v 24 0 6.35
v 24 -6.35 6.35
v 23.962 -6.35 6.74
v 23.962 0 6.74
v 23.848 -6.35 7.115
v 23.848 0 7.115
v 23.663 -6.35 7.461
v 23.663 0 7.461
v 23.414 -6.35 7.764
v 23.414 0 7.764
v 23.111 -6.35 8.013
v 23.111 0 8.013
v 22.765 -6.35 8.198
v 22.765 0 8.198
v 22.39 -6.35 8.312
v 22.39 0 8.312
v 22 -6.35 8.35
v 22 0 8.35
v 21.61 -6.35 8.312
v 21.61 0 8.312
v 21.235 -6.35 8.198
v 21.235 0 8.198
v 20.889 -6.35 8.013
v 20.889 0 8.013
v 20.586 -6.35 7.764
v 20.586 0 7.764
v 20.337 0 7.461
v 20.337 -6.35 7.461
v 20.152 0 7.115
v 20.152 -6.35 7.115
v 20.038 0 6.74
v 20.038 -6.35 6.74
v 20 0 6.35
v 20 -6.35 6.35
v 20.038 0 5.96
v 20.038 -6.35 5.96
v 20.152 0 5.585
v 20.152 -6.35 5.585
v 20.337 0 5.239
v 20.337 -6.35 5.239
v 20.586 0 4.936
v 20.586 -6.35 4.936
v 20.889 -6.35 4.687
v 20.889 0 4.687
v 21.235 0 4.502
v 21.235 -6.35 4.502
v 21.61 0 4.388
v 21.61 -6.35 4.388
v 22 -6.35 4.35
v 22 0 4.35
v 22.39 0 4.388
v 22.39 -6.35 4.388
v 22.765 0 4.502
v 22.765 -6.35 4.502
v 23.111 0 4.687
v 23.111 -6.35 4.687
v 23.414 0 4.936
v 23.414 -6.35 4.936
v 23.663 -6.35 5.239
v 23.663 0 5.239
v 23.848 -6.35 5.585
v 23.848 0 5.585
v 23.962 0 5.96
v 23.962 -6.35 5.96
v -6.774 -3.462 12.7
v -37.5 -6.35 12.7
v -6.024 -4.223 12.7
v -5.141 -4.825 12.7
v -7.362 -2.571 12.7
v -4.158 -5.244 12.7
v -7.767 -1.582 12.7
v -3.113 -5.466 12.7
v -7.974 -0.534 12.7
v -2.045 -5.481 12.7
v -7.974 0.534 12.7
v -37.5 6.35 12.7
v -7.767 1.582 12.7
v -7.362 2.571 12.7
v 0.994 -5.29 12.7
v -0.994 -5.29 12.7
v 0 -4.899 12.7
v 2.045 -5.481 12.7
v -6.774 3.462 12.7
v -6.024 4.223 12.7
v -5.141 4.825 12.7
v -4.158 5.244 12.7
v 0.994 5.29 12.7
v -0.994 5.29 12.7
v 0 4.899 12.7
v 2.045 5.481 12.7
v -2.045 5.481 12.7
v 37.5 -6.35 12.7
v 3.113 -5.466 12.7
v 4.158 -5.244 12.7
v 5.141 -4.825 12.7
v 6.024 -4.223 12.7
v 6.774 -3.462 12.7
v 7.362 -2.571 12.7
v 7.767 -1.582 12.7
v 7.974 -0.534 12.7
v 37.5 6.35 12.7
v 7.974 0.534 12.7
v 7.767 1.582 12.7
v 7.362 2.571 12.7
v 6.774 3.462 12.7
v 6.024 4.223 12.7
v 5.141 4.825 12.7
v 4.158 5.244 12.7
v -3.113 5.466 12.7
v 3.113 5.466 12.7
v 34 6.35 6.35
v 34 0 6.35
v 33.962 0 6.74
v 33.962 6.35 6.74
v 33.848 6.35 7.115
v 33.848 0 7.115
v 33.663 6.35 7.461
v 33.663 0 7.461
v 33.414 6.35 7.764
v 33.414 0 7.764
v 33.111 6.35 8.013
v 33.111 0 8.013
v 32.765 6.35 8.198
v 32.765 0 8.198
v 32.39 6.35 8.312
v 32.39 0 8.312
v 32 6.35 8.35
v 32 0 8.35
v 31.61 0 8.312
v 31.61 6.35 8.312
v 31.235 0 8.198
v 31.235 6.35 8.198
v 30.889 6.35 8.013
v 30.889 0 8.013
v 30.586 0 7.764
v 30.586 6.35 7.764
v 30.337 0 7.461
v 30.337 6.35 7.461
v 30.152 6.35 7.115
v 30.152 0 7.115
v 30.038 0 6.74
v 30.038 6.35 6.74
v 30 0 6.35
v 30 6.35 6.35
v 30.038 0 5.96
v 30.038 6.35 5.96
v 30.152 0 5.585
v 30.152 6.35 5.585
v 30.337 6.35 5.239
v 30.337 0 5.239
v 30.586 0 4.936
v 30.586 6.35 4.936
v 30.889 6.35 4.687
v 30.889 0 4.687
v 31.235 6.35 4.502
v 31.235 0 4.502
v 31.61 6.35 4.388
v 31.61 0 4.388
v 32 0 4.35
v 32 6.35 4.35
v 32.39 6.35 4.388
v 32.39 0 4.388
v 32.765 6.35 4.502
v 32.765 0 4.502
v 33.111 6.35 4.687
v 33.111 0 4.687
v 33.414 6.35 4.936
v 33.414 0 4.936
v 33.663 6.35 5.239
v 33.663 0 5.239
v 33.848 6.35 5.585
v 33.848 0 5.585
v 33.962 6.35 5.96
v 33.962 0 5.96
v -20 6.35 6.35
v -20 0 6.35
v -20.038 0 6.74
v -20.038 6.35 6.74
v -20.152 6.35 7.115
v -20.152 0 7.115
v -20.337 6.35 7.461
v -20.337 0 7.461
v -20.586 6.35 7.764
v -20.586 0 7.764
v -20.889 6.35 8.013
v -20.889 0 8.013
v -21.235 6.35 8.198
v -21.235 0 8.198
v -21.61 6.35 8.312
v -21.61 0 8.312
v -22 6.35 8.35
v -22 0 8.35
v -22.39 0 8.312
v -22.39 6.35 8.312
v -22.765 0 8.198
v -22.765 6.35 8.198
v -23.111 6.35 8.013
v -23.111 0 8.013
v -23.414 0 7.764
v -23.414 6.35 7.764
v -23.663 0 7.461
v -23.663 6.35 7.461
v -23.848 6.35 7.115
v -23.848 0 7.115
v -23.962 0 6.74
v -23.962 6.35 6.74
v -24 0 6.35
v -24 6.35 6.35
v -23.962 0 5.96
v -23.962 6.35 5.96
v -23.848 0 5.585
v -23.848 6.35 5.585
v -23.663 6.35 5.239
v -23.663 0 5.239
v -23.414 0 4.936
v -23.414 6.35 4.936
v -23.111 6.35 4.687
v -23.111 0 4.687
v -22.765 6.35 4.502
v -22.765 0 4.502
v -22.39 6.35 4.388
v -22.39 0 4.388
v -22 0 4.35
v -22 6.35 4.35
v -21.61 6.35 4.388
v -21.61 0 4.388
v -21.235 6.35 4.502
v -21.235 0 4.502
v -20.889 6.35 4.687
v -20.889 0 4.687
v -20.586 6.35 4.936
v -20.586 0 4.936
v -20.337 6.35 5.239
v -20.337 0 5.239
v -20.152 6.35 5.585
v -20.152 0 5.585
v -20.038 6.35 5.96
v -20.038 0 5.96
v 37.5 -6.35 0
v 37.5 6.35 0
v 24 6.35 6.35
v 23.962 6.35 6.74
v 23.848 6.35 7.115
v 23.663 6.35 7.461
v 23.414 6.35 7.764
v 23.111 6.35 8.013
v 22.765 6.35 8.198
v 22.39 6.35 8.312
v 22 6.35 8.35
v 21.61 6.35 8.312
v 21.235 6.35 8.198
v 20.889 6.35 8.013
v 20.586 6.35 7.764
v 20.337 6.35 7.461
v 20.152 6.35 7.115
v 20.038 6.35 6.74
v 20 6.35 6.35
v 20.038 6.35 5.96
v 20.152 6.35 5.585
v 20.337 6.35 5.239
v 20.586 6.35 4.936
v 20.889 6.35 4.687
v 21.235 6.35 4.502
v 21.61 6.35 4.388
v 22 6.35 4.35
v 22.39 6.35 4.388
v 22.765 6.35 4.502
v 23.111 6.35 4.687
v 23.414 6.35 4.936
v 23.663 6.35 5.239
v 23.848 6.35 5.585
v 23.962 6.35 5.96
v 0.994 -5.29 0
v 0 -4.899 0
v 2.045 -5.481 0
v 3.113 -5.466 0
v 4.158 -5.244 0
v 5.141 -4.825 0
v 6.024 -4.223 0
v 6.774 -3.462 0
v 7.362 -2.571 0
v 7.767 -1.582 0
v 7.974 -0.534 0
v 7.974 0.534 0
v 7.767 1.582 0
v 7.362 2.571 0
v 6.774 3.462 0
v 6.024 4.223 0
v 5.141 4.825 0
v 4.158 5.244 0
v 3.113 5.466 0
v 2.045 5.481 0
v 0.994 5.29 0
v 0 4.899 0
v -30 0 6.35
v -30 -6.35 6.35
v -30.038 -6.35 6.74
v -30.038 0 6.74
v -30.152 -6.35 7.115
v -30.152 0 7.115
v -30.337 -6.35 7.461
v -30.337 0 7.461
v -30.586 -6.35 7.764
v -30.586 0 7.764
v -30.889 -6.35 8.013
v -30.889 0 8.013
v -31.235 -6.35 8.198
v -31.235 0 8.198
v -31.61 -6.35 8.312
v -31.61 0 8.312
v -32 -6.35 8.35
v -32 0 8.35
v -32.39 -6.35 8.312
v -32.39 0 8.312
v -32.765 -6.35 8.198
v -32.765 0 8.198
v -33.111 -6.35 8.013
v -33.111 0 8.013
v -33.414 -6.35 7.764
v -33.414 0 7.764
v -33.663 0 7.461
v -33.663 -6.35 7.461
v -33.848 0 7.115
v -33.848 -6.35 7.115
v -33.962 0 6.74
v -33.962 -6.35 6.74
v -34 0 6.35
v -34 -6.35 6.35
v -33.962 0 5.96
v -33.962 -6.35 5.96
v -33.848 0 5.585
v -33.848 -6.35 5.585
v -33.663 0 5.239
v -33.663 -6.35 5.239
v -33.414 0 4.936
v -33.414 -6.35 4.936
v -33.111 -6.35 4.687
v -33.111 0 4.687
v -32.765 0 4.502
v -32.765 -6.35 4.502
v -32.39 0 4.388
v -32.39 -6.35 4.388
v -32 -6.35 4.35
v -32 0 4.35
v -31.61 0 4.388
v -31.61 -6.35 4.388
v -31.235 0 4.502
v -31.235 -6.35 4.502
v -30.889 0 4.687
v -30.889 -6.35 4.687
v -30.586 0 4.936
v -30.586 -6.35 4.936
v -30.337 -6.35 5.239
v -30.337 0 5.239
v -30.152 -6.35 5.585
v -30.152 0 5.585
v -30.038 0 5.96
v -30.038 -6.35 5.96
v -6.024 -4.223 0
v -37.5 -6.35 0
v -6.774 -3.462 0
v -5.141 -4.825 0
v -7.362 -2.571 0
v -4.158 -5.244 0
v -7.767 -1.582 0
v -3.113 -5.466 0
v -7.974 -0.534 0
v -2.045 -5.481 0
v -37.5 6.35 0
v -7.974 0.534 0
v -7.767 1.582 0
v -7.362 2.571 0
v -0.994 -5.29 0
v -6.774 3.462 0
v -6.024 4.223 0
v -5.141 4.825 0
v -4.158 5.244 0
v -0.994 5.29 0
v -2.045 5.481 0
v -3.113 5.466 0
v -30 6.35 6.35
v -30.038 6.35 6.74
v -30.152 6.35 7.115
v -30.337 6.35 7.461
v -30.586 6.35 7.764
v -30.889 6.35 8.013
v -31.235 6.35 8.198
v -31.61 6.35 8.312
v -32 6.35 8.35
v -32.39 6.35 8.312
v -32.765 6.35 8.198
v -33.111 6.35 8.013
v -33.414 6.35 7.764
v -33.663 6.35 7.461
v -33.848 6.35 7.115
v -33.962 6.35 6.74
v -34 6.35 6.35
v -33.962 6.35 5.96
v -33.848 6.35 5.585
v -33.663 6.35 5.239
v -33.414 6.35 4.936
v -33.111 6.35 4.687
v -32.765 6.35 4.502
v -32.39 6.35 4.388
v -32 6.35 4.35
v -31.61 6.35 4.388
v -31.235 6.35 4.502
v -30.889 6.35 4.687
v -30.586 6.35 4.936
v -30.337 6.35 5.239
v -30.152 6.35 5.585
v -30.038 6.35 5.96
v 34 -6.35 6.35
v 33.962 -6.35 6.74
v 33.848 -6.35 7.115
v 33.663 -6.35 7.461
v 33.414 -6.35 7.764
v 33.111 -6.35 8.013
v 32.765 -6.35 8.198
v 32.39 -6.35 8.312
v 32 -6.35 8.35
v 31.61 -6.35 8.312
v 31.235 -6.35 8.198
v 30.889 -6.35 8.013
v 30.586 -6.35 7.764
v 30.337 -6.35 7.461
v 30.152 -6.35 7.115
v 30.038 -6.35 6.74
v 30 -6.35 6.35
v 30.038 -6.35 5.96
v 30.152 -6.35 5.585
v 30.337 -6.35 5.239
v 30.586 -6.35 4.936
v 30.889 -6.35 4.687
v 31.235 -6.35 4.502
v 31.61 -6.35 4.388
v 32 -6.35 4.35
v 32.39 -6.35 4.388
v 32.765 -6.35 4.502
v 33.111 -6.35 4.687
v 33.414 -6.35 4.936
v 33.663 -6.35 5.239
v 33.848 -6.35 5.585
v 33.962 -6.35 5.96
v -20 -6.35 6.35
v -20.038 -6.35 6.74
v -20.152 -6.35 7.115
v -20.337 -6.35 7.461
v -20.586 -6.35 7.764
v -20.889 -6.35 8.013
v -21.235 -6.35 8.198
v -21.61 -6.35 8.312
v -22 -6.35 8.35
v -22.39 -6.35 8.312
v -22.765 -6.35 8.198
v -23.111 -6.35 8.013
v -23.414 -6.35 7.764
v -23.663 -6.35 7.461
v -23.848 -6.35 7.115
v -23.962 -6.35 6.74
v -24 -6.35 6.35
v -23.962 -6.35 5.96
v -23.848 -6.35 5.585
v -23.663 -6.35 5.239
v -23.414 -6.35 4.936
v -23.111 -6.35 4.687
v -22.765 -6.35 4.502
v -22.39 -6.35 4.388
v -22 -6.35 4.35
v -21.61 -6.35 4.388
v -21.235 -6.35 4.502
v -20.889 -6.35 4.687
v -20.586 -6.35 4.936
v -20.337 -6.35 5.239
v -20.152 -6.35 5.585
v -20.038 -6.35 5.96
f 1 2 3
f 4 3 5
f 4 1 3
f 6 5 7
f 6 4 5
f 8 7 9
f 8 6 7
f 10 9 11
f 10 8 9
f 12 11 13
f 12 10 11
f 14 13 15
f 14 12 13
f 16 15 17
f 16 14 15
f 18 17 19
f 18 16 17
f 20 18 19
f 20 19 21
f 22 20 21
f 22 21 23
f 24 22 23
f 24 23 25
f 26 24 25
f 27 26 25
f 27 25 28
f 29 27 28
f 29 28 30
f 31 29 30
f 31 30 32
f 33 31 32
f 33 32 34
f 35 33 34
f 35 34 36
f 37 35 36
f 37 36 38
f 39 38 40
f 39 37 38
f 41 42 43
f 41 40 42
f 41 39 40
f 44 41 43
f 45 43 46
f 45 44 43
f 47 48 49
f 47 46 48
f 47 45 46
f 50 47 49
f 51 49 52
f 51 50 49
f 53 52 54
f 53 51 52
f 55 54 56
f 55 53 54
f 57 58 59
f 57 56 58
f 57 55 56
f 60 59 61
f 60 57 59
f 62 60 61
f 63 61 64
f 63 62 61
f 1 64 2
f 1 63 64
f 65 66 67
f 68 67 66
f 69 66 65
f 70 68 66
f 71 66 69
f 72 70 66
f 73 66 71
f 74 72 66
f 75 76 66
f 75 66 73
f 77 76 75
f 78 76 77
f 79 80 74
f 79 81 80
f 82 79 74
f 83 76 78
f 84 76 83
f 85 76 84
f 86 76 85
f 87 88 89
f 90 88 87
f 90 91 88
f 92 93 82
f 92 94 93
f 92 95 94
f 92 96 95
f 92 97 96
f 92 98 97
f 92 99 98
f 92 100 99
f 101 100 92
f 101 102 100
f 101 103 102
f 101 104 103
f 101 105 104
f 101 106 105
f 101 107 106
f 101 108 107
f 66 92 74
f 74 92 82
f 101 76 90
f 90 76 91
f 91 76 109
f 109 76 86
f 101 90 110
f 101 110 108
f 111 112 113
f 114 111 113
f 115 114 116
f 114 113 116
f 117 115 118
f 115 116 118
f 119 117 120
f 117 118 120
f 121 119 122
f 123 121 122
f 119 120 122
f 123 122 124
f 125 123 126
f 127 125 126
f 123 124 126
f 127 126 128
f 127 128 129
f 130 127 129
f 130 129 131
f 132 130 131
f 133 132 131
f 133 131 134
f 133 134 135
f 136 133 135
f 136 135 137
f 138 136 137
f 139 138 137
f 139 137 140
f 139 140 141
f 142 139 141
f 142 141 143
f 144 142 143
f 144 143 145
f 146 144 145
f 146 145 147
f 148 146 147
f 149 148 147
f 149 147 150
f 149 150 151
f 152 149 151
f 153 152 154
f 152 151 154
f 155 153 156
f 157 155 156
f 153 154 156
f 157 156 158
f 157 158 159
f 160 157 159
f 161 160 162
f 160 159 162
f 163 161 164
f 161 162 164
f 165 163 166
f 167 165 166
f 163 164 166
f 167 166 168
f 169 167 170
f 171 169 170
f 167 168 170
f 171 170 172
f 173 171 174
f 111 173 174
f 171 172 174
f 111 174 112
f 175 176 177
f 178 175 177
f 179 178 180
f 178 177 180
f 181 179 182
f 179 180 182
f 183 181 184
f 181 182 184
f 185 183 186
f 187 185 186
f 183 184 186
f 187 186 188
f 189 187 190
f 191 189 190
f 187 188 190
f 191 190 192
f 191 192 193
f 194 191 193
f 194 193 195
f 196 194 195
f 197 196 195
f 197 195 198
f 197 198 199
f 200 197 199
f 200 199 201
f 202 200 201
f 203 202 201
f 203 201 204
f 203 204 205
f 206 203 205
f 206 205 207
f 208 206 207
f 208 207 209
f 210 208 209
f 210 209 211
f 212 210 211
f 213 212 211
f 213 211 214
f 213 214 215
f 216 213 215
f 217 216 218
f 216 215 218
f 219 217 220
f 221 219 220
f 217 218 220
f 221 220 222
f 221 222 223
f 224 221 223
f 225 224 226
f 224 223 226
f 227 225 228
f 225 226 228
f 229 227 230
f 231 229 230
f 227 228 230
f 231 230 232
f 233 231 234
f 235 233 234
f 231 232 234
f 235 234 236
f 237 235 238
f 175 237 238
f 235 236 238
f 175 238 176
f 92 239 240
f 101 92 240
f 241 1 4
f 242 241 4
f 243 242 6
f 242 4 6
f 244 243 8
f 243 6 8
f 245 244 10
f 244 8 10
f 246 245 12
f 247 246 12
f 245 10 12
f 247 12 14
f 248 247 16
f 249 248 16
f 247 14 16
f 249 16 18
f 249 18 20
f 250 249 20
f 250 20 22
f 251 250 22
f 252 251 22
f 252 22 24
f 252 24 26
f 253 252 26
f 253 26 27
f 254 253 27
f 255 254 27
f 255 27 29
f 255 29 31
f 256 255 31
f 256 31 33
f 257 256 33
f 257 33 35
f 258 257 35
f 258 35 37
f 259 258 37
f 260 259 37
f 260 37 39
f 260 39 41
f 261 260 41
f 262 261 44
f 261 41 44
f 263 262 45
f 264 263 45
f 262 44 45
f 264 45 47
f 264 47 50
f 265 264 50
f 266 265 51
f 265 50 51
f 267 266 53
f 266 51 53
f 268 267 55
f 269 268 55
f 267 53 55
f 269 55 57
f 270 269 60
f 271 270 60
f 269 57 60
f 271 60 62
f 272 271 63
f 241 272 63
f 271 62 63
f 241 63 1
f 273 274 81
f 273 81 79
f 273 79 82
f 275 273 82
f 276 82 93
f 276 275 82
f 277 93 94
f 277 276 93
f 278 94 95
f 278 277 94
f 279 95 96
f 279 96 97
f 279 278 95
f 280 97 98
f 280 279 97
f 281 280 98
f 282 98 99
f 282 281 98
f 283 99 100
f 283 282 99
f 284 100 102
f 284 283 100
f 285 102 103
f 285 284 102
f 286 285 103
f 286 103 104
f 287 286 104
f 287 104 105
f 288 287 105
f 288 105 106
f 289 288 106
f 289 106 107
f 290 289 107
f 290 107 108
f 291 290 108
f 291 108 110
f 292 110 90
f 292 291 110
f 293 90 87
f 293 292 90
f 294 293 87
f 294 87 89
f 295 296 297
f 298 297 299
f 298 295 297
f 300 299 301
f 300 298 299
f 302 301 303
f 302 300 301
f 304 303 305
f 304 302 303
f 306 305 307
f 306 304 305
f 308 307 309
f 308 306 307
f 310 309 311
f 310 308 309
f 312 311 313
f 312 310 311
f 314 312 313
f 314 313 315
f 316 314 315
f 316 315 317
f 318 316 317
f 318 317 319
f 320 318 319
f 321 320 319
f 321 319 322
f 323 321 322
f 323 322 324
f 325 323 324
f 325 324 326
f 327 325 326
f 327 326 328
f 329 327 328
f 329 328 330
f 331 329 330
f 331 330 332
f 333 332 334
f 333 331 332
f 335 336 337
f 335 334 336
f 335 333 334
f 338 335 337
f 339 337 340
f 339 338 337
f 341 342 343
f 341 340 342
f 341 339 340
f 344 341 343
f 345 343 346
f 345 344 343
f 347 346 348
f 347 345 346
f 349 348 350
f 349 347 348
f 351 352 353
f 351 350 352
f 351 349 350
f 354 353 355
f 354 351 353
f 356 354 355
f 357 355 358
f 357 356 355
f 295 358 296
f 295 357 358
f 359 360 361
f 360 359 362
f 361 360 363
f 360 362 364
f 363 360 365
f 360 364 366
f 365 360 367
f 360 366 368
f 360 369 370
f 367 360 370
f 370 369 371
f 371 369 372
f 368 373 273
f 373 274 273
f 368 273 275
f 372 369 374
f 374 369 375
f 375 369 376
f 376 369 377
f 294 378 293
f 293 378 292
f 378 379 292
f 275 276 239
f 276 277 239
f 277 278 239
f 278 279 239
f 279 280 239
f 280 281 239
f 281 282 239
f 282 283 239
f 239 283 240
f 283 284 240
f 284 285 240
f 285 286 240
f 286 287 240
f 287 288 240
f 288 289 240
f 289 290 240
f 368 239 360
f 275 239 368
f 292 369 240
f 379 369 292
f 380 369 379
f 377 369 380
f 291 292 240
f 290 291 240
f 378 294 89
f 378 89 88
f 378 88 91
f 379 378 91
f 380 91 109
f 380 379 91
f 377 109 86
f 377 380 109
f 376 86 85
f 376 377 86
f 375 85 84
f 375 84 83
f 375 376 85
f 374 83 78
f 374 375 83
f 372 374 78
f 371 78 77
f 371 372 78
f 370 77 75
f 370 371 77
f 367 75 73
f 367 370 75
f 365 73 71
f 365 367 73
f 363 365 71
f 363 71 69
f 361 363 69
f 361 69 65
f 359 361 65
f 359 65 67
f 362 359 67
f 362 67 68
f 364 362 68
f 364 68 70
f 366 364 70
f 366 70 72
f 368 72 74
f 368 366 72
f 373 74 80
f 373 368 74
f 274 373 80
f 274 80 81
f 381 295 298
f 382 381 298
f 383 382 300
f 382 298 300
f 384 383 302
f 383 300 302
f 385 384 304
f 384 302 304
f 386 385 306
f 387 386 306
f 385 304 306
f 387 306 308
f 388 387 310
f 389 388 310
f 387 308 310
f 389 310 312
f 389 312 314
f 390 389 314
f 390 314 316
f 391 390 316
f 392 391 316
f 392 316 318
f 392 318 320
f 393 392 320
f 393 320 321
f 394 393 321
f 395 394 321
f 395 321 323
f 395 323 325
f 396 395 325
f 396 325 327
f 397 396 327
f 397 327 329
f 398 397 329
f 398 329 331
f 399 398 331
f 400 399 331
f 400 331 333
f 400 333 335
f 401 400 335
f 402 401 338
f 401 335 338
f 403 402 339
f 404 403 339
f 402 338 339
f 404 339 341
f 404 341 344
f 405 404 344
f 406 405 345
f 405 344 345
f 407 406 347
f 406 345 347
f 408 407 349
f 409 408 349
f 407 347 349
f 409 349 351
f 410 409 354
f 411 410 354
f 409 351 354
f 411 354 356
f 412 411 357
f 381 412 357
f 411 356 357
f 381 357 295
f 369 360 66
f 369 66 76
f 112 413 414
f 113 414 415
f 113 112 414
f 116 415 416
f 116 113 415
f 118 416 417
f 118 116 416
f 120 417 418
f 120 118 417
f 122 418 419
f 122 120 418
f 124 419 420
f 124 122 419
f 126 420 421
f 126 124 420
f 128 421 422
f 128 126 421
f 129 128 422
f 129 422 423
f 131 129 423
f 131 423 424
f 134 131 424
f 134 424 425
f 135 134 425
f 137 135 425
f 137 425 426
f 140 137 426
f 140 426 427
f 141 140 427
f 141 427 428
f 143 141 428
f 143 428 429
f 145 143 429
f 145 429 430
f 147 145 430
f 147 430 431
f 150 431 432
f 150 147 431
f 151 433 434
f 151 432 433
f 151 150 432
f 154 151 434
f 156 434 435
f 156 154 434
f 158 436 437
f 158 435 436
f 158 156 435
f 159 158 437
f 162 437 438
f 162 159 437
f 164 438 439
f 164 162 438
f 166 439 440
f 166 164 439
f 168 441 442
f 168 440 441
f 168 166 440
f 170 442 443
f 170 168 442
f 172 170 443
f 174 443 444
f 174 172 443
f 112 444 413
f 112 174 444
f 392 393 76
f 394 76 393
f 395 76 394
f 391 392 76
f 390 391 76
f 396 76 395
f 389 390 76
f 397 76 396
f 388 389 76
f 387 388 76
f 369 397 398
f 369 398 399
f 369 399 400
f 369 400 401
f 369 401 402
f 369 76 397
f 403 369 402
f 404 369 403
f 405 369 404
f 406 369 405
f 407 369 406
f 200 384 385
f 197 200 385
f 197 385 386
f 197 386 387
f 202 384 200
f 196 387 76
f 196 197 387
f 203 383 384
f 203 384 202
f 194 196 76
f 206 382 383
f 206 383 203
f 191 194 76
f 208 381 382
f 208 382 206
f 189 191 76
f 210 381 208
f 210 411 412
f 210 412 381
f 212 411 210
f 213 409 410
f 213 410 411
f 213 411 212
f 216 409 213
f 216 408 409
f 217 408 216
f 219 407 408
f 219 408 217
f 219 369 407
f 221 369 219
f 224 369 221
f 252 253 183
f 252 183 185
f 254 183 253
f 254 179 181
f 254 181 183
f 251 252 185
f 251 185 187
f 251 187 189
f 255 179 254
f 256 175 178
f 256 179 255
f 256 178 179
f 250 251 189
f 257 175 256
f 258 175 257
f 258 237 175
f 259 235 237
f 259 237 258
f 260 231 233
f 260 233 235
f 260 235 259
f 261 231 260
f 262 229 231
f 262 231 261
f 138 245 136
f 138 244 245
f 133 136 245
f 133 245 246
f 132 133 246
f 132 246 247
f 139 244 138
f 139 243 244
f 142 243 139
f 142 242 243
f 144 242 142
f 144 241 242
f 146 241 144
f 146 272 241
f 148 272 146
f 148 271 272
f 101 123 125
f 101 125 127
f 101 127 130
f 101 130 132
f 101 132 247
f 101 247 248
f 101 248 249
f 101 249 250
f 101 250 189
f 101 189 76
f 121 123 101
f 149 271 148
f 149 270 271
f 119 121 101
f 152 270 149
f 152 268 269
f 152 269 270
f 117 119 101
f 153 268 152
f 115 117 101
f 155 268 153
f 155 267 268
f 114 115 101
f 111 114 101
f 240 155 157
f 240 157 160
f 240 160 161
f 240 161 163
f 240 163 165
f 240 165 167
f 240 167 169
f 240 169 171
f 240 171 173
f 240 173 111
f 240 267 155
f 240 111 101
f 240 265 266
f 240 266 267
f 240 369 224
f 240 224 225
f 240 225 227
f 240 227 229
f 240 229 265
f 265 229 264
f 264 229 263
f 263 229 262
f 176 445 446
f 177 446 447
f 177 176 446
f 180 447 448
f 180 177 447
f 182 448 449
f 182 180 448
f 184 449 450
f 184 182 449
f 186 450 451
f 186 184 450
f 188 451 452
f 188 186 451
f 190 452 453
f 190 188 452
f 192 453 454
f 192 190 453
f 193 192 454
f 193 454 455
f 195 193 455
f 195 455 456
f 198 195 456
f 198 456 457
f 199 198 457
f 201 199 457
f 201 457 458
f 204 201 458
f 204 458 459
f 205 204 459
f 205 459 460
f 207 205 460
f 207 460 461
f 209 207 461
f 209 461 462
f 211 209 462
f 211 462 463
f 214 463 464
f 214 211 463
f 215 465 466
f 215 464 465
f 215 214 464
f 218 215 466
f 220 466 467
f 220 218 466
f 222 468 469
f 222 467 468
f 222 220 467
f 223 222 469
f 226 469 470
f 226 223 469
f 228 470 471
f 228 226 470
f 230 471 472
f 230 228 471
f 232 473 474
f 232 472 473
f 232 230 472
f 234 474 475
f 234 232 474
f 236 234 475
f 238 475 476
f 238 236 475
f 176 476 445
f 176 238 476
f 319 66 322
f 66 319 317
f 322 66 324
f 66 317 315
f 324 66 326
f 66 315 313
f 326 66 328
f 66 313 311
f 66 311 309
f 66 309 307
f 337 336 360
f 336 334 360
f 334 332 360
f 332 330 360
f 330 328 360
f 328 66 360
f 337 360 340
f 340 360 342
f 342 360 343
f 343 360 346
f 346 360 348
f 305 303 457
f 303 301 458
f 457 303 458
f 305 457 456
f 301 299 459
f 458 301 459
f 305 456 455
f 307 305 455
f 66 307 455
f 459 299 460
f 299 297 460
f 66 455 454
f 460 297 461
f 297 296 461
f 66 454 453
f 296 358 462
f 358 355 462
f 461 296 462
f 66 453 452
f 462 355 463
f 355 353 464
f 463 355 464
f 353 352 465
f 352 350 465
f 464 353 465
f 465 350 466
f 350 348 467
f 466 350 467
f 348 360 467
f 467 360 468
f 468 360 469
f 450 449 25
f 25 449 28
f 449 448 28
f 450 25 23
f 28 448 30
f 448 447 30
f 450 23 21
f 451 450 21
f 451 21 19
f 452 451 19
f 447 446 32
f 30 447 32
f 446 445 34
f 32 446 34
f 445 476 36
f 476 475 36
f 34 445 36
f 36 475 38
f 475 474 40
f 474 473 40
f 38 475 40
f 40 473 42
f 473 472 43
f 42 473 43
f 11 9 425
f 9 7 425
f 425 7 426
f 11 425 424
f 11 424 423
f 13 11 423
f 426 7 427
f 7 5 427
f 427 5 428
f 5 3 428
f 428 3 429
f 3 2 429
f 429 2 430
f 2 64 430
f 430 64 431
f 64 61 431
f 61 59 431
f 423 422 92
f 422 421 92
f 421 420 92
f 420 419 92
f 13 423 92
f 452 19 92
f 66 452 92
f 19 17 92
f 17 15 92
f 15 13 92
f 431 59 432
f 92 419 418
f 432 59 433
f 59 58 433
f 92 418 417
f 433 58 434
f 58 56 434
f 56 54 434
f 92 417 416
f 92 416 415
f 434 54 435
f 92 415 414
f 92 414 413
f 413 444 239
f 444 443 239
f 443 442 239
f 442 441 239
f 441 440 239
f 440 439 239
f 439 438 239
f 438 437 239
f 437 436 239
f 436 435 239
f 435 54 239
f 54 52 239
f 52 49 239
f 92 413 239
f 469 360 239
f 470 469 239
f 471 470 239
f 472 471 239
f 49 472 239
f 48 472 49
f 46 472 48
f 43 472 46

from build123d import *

# Parameters (mm, degrees)
SKETCH_W          = 75
SKETCH_H          = 12.7
PAD_DEPTH         = 12.7
SKETCH001_R       = 2
POCKET_DEPTH      = 6.351
POCKET_DEPTH_BACK = -6.351


with BuildPart() as part:
    # Sketch → Pad (new body)
    with BuildSketch(Plane.XY):
        Rectangle(SKETCH_W, SKETCH_H)
        with BuildLine():
            ThreePointArc((0, -4.898979), (8, 0), (0, 4.898979))
            ThreePointArc((0, 4.898979), (-8, 0), (0, -4.898979))
        make_face(mode=Mode.SUBTRACT)
    extrude(amount=PAD_DEPTH)

    # Sketch001 → Pocket (cut, two sides)
    with BuildSketch(Plane.XZ) as pocket_sk:
        with Locations((-32, 6.35)):
            Circle(SKETCH001_R)
        with Locations((-22, 6.35)):
            Circle(SKETCH001_R)
        with Locations((22, 6.35)):
            Circle(SKETCH001_R)
        with Locations((32, 6.35)):
            Circle(SKETCH001_R)
    extrude(amount=-POCKET_DEPTH, mode=Mode.SUBTRACT)
    extrude(pocket_sk.sketch, amount=-POCKET_DEPTH_BACK, mode=Mode.SUBTRACT)


solid = part.part
